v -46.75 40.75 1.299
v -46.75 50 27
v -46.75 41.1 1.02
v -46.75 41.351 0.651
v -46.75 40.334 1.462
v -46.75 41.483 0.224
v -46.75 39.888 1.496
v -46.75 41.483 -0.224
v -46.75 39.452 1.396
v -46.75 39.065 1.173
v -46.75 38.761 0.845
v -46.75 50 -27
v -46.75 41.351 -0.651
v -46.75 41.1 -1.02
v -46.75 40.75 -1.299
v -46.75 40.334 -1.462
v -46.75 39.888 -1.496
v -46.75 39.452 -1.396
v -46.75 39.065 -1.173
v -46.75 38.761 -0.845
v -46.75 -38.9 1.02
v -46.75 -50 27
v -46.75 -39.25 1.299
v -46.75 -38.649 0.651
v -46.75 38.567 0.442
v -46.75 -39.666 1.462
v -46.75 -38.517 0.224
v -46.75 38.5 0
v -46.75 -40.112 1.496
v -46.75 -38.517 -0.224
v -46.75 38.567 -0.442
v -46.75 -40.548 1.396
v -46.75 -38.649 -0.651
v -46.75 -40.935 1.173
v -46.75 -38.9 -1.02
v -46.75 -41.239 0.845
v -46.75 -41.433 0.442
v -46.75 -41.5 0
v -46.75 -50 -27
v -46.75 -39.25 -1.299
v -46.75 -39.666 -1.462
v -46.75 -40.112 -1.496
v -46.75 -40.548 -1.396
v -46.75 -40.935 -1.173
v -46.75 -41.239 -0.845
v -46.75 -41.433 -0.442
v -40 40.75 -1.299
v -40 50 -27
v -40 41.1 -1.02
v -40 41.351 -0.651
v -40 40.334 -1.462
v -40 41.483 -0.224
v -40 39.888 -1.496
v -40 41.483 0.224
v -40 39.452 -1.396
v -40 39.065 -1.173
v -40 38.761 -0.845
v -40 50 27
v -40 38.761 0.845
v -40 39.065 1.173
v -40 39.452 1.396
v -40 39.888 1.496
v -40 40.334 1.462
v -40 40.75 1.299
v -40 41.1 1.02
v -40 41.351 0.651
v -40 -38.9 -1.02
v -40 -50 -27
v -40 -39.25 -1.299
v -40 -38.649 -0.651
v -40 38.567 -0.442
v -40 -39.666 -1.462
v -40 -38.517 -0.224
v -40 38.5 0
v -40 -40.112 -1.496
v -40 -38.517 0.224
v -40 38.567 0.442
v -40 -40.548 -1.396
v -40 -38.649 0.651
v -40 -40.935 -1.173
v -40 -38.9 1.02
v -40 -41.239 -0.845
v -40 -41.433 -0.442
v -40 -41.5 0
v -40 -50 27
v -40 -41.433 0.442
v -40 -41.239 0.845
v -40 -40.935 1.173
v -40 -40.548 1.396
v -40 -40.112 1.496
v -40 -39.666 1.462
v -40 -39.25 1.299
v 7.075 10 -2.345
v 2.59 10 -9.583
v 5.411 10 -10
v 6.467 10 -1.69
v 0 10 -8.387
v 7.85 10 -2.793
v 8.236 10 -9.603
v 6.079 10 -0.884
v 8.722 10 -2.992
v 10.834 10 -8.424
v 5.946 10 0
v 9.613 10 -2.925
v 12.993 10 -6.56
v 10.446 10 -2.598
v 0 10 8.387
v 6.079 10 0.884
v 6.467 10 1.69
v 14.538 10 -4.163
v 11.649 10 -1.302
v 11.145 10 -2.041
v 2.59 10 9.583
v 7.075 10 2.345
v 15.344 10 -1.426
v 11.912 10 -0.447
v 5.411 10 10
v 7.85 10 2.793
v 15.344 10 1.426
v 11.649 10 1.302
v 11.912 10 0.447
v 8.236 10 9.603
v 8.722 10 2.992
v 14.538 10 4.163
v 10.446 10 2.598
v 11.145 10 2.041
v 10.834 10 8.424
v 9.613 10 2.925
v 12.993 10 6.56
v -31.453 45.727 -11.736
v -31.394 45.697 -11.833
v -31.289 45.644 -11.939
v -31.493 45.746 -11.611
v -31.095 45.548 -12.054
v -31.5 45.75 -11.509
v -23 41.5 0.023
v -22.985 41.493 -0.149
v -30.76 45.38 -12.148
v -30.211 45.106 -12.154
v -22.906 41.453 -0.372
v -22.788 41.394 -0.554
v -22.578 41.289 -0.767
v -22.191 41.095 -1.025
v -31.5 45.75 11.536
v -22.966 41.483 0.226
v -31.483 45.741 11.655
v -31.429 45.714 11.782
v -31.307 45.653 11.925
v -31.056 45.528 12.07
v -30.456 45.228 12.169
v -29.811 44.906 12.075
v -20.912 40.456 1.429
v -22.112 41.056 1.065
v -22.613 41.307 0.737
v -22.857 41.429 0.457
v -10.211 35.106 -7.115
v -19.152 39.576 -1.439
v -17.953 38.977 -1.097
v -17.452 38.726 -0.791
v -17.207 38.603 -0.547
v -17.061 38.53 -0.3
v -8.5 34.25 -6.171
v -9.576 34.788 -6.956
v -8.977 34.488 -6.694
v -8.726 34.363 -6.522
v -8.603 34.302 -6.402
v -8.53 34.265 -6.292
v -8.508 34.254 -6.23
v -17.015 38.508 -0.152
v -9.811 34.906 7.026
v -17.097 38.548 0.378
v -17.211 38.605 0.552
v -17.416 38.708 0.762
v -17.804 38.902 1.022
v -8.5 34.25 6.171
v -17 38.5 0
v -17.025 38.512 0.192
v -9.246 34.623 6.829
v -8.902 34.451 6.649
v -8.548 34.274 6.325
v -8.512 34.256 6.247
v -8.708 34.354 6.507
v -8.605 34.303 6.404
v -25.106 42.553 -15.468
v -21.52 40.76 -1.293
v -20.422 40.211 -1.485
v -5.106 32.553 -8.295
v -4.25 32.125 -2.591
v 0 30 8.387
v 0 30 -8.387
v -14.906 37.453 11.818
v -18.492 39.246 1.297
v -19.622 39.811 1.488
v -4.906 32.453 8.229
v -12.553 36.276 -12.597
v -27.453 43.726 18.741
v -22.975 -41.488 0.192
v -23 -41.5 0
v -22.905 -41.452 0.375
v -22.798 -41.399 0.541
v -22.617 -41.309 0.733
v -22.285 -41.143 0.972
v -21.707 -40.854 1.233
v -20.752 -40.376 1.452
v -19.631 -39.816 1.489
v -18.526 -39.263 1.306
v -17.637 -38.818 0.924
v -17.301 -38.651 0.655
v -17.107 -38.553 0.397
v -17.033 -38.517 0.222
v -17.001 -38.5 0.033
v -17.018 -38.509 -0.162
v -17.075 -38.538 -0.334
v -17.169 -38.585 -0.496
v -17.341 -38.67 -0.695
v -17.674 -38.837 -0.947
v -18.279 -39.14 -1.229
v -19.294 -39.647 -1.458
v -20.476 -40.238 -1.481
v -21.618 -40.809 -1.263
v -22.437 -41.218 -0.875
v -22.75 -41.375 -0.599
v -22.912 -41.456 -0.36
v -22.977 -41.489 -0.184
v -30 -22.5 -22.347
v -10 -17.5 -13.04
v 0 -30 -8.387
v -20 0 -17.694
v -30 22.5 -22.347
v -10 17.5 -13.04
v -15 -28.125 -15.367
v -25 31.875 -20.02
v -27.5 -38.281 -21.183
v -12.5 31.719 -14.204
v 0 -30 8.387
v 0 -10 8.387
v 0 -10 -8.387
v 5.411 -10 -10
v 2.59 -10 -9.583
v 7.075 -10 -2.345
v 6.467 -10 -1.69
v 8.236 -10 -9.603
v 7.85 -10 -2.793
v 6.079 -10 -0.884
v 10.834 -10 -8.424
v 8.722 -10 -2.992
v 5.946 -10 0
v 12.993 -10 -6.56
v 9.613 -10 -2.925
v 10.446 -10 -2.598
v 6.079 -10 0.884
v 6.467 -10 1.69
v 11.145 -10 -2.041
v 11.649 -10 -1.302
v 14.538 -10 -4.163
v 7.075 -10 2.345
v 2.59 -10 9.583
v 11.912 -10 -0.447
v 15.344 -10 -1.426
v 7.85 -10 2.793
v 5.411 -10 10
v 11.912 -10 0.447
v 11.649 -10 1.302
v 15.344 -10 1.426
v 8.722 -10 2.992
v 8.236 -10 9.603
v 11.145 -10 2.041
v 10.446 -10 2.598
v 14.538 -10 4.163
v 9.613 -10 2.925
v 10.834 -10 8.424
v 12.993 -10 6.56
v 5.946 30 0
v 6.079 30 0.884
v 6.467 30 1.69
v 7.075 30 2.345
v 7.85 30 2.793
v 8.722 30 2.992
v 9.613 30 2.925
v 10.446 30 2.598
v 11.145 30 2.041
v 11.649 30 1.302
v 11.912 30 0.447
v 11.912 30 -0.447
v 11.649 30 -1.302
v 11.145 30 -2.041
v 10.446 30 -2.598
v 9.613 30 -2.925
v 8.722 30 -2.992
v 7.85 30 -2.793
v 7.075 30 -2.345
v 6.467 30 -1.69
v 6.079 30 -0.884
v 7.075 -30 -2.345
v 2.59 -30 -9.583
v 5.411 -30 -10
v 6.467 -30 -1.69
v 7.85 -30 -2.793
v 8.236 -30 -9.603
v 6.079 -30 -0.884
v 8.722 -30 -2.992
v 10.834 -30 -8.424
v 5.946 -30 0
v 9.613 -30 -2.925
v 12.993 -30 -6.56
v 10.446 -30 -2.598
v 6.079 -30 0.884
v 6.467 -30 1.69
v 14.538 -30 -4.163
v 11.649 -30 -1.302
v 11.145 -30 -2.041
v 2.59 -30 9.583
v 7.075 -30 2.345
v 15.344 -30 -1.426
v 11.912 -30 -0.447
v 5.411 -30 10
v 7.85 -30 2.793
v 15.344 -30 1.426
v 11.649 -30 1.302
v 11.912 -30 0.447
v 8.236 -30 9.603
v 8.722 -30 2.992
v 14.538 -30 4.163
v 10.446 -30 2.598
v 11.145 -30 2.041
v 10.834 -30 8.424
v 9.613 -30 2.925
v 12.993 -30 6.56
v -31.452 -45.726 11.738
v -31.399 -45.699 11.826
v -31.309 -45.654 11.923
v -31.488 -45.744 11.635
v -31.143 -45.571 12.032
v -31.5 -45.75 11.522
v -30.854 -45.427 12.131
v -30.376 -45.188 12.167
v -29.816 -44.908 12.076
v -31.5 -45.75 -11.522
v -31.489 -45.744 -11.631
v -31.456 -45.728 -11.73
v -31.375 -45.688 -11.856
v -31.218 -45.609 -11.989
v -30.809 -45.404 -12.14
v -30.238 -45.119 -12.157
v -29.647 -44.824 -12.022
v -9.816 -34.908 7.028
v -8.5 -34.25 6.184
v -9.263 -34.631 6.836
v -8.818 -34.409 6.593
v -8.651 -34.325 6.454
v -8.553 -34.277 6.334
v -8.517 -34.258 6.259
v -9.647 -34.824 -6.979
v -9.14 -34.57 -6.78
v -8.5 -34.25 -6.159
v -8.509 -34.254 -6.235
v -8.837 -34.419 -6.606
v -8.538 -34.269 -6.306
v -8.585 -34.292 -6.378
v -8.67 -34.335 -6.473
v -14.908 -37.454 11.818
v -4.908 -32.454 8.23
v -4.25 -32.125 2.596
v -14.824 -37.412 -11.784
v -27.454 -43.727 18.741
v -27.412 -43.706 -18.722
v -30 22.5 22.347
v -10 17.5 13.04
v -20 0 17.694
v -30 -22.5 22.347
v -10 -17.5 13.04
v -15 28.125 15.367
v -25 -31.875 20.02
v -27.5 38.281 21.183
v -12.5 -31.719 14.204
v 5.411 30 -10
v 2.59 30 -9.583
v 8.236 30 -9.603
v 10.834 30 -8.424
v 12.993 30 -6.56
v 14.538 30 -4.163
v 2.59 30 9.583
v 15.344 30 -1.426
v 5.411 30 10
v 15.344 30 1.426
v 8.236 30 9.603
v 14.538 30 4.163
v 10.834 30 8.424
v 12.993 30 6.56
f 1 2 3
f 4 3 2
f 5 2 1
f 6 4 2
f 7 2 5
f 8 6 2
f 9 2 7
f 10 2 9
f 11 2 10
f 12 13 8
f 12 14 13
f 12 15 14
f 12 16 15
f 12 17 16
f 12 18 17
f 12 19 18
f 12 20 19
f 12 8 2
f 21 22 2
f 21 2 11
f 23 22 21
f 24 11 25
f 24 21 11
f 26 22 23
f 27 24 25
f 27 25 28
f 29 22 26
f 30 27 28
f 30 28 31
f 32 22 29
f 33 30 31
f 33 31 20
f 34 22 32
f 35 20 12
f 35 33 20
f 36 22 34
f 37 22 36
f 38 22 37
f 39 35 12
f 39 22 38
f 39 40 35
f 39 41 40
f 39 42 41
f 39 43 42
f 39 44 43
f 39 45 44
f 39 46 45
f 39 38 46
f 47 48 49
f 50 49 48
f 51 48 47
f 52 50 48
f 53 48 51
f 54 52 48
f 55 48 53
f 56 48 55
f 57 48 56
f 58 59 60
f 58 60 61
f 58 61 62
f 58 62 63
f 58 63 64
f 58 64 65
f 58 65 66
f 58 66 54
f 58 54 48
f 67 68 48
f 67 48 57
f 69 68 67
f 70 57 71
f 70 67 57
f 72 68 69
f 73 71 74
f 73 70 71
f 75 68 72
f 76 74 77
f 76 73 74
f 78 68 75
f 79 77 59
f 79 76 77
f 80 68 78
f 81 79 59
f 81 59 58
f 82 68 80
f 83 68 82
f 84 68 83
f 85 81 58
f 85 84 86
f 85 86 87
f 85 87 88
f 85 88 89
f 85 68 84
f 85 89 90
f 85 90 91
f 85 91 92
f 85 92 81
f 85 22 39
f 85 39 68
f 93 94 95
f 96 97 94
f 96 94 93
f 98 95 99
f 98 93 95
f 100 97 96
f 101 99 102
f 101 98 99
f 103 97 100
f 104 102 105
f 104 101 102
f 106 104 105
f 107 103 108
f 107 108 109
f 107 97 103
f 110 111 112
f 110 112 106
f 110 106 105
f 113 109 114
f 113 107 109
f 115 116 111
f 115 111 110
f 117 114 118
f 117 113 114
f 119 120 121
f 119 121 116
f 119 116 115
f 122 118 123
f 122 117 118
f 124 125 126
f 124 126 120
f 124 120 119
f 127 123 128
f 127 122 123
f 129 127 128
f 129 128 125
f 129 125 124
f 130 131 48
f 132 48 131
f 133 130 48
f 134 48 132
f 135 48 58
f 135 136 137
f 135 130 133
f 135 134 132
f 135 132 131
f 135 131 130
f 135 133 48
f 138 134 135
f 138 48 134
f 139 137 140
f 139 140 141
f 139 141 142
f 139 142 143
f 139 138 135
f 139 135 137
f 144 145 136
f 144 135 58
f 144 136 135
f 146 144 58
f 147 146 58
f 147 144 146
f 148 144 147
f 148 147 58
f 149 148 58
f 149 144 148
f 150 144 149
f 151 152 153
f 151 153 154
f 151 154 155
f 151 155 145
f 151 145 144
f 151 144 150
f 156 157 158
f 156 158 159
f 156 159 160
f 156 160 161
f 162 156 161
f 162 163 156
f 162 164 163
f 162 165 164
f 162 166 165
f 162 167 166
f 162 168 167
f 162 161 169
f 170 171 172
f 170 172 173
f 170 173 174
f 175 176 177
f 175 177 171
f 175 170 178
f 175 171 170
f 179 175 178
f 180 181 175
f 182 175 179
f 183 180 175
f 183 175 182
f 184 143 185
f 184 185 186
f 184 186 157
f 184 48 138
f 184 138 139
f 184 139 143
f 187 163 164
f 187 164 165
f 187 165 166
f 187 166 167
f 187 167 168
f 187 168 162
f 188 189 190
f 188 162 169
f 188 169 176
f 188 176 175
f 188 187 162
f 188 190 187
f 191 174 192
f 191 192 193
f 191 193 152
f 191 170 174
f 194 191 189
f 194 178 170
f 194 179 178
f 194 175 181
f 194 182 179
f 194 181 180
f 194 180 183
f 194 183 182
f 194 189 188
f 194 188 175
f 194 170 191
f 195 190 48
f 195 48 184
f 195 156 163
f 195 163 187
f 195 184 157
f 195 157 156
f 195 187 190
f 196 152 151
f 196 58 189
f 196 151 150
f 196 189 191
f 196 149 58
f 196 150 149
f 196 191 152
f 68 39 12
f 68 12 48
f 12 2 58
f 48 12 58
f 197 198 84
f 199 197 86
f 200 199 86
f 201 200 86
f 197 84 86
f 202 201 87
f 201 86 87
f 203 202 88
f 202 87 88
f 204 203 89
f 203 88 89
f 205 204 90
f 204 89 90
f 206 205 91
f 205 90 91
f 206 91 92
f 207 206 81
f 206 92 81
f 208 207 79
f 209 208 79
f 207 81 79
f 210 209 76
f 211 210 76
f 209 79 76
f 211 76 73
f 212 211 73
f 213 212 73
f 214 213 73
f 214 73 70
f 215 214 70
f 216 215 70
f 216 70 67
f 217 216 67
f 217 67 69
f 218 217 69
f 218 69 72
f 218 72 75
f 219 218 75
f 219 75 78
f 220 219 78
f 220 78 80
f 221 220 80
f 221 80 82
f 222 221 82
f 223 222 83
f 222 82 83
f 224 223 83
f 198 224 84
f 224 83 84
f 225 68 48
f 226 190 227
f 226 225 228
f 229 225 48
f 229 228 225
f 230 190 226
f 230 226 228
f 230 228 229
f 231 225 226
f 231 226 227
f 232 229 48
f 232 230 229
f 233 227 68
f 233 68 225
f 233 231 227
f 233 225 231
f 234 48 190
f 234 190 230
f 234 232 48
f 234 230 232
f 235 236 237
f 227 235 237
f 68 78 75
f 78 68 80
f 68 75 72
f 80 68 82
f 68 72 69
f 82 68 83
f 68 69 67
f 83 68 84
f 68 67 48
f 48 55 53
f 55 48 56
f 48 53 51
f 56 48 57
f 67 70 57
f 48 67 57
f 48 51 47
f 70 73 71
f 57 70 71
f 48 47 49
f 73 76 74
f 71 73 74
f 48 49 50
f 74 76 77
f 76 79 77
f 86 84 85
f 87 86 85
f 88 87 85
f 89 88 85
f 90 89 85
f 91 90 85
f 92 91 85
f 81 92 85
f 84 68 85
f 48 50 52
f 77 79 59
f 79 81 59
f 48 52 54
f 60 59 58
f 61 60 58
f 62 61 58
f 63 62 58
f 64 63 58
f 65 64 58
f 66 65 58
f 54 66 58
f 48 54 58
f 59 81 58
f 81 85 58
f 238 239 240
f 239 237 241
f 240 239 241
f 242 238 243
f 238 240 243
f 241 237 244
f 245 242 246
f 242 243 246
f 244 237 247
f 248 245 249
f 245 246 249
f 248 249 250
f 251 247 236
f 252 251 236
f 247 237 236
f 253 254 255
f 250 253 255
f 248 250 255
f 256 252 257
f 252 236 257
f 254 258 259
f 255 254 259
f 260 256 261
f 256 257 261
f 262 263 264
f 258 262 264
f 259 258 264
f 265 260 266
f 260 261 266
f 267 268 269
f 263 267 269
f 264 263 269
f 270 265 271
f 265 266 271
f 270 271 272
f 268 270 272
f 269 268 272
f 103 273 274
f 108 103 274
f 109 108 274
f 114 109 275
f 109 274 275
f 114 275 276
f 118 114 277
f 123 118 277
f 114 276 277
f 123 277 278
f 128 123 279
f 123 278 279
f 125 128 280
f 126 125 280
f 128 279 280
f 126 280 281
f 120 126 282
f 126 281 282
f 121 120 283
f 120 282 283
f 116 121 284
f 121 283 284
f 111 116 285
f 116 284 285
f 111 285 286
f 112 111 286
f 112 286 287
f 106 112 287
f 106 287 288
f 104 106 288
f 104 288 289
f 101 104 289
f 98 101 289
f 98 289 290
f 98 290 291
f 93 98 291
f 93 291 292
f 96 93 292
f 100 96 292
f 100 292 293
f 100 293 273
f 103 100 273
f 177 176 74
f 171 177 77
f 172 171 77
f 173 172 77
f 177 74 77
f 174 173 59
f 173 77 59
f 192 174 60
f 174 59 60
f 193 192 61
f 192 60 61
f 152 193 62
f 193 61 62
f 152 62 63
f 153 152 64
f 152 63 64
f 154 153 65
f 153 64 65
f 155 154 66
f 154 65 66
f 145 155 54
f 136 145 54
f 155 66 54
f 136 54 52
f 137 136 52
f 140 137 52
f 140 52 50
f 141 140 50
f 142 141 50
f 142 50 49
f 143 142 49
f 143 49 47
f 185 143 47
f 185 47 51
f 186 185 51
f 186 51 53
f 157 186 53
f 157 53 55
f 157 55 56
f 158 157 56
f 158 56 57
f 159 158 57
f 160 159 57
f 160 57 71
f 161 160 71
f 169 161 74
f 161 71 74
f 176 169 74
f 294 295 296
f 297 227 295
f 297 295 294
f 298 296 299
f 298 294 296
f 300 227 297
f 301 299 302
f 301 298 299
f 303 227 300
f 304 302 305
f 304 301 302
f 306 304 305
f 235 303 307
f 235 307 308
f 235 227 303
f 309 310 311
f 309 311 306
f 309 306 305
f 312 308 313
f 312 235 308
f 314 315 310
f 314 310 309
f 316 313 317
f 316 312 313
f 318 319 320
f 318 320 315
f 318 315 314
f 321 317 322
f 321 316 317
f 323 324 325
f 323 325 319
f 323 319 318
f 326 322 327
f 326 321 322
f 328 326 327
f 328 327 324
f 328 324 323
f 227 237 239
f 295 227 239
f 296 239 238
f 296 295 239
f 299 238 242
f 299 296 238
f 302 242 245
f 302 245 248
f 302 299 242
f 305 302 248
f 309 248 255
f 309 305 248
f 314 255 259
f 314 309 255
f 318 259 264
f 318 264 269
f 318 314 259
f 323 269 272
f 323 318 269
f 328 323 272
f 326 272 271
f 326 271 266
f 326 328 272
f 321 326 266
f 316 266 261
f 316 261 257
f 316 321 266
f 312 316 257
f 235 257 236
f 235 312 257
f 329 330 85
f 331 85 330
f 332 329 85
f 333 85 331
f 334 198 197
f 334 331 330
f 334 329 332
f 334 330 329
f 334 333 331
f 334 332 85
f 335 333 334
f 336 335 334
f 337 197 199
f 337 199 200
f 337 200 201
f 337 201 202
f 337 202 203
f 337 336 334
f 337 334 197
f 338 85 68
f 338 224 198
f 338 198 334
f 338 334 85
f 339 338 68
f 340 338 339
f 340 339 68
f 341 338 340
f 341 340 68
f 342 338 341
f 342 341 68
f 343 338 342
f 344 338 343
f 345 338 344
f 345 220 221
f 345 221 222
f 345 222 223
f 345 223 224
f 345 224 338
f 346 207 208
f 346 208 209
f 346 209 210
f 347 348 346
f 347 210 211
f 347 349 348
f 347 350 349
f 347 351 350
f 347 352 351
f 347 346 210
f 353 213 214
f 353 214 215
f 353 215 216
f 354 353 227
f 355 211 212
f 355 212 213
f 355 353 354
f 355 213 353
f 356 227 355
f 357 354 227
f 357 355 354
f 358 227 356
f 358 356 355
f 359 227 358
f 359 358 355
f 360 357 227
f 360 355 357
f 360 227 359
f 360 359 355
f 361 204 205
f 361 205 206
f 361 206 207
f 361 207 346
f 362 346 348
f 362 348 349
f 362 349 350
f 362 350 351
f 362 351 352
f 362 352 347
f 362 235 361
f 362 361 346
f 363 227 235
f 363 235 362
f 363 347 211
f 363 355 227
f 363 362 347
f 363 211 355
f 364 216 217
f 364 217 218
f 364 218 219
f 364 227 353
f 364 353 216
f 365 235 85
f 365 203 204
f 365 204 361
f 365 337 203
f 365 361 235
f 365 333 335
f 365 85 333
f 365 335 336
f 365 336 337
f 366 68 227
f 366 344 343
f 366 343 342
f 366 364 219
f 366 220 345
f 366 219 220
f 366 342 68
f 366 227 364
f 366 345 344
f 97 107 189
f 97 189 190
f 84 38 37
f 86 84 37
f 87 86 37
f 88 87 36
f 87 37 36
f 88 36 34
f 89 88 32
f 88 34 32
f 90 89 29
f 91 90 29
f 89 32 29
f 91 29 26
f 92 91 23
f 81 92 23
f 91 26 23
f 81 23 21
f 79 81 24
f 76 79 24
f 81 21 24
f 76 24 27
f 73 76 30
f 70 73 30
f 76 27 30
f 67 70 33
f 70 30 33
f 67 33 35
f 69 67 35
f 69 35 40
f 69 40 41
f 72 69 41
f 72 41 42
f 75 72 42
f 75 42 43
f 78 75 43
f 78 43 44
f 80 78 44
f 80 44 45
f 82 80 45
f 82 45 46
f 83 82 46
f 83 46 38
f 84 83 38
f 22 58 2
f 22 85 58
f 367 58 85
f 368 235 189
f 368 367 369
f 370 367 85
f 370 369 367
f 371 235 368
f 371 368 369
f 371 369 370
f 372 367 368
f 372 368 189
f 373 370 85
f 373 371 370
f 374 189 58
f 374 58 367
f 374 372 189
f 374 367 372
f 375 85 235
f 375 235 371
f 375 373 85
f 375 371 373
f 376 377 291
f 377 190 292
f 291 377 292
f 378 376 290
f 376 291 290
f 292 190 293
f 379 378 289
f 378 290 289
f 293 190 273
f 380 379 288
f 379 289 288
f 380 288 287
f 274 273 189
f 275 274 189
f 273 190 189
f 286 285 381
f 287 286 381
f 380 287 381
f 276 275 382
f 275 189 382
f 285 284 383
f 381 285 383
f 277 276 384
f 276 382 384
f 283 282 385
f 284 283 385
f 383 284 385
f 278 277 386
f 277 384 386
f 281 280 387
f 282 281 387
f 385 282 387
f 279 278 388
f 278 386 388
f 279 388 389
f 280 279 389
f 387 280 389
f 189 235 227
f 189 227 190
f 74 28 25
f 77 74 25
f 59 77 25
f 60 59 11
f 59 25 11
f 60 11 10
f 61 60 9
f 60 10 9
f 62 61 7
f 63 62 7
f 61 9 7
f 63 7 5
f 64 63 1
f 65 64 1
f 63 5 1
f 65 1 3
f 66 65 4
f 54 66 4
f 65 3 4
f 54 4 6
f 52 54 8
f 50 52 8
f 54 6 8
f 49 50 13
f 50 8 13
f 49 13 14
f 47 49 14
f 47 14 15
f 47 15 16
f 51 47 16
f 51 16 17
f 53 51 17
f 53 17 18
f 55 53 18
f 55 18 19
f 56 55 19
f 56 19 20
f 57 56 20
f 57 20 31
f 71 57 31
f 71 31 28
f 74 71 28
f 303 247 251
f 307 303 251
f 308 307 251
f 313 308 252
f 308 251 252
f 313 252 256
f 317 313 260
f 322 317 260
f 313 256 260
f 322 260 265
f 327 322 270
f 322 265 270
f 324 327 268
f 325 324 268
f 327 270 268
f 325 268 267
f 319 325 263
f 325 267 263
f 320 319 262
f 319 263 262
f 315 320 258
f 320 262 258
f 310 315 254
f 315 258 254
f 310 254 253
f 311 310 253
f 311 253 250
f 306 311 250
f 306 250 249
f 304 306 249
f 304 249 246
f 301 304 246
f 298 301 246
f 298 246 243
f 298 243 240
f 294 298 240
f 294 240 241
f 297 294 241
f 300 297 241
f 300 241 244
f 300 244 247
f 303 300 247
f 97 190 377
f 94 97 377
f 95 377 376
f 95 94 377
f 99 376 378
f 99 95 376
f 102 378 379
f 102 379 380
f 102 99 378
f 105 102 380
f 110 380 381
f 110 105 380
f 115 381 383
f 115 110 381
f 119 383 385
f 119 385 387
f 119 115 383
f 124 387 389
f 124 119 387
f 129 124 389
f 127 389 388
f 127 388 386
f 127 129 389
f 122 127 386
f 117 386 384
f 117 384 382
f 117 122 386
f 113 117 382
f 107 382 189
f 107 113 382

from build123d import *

# Parameters (mm, degrees)
F1_DEPTH  = 30
F3_DEPTH  = 50
F3_FACE_W = 100
F3_FACE_H = 54
F1_FACE_W = 60
F1_FACE_H = 16.774194
F6_W      = 24
F6_H      = 20
F7_DEPTH  = 16.5
F9_D      = 3
F9_2_D    = 3
F10_D     = 6


with BuildPart() as f1:
    # F0 (on Front) → F1 (new body, symmetric)
    with BuildSketch(Plane.XZ):
        with BuildLine():
            Line((0, 8.387097), (0, -8.387097))
            ThreePointArc((0, -8.387097), (15.445788, 0), (0, 8.387097))
        make_face()
    extrude(amount=F1_DEPTH, both=True)

    # F6 (on Top) → F7 (cut, symmetric)
    with BuildSketch(Plane.XY):
        with Locations((12, 0)):
            Rectangle(F6_W, F6_H)
    extrude(amount=F7_DEPTH, both=True, mode=Mode.SUBTRACT)

    # F10 (through all)
    with Locations(Plane.XZ.offset(30)):
        with Locations((8.945788, 0)):
            Hole(F10_D / 2)


with BuildPart() as f3:
    # F2 (on Front) → F3 (new body, symmetric)
    with BuildSketch(Plane.XZ):
        Polygon((-40, 27), (-46.75, 27), (-46.75, 0), (-46.75, -27), (-40, -27), (-40, 0), align=None)
    extrude(amount=F3_DEPTH, both=True)

    # F9 (through all)
    with Locations(Plane.YZ):
        with Locations((-40, 0), (40, 0)):
            Hole(F9_D / 2)


with BuildPart() as f4:
    # F3_face (on face) → F4 section 0
    with BuildSketch(Plane.YZ.offset(-40)):
        Rectangle(F3_FACE_W, F3_FACE_H)
    # F1_face (on face) → F4 section 1
    with BuildSketch(Plane(origin=(0, 0, 0), x_dir=(0, -1, 0), z_dir=(-1, 0, 0))):
        Rectangle(F1_FACE_W, F1_FACE_H)
    loft()

    # F9#2 (through all)
    with Locations(Plane.YZ):
        with Locations((-40, 0), (40, 0)):
            Hole(F9_2_D / 2)


solid = Compound([f1.part, f3.part, f4.part])
